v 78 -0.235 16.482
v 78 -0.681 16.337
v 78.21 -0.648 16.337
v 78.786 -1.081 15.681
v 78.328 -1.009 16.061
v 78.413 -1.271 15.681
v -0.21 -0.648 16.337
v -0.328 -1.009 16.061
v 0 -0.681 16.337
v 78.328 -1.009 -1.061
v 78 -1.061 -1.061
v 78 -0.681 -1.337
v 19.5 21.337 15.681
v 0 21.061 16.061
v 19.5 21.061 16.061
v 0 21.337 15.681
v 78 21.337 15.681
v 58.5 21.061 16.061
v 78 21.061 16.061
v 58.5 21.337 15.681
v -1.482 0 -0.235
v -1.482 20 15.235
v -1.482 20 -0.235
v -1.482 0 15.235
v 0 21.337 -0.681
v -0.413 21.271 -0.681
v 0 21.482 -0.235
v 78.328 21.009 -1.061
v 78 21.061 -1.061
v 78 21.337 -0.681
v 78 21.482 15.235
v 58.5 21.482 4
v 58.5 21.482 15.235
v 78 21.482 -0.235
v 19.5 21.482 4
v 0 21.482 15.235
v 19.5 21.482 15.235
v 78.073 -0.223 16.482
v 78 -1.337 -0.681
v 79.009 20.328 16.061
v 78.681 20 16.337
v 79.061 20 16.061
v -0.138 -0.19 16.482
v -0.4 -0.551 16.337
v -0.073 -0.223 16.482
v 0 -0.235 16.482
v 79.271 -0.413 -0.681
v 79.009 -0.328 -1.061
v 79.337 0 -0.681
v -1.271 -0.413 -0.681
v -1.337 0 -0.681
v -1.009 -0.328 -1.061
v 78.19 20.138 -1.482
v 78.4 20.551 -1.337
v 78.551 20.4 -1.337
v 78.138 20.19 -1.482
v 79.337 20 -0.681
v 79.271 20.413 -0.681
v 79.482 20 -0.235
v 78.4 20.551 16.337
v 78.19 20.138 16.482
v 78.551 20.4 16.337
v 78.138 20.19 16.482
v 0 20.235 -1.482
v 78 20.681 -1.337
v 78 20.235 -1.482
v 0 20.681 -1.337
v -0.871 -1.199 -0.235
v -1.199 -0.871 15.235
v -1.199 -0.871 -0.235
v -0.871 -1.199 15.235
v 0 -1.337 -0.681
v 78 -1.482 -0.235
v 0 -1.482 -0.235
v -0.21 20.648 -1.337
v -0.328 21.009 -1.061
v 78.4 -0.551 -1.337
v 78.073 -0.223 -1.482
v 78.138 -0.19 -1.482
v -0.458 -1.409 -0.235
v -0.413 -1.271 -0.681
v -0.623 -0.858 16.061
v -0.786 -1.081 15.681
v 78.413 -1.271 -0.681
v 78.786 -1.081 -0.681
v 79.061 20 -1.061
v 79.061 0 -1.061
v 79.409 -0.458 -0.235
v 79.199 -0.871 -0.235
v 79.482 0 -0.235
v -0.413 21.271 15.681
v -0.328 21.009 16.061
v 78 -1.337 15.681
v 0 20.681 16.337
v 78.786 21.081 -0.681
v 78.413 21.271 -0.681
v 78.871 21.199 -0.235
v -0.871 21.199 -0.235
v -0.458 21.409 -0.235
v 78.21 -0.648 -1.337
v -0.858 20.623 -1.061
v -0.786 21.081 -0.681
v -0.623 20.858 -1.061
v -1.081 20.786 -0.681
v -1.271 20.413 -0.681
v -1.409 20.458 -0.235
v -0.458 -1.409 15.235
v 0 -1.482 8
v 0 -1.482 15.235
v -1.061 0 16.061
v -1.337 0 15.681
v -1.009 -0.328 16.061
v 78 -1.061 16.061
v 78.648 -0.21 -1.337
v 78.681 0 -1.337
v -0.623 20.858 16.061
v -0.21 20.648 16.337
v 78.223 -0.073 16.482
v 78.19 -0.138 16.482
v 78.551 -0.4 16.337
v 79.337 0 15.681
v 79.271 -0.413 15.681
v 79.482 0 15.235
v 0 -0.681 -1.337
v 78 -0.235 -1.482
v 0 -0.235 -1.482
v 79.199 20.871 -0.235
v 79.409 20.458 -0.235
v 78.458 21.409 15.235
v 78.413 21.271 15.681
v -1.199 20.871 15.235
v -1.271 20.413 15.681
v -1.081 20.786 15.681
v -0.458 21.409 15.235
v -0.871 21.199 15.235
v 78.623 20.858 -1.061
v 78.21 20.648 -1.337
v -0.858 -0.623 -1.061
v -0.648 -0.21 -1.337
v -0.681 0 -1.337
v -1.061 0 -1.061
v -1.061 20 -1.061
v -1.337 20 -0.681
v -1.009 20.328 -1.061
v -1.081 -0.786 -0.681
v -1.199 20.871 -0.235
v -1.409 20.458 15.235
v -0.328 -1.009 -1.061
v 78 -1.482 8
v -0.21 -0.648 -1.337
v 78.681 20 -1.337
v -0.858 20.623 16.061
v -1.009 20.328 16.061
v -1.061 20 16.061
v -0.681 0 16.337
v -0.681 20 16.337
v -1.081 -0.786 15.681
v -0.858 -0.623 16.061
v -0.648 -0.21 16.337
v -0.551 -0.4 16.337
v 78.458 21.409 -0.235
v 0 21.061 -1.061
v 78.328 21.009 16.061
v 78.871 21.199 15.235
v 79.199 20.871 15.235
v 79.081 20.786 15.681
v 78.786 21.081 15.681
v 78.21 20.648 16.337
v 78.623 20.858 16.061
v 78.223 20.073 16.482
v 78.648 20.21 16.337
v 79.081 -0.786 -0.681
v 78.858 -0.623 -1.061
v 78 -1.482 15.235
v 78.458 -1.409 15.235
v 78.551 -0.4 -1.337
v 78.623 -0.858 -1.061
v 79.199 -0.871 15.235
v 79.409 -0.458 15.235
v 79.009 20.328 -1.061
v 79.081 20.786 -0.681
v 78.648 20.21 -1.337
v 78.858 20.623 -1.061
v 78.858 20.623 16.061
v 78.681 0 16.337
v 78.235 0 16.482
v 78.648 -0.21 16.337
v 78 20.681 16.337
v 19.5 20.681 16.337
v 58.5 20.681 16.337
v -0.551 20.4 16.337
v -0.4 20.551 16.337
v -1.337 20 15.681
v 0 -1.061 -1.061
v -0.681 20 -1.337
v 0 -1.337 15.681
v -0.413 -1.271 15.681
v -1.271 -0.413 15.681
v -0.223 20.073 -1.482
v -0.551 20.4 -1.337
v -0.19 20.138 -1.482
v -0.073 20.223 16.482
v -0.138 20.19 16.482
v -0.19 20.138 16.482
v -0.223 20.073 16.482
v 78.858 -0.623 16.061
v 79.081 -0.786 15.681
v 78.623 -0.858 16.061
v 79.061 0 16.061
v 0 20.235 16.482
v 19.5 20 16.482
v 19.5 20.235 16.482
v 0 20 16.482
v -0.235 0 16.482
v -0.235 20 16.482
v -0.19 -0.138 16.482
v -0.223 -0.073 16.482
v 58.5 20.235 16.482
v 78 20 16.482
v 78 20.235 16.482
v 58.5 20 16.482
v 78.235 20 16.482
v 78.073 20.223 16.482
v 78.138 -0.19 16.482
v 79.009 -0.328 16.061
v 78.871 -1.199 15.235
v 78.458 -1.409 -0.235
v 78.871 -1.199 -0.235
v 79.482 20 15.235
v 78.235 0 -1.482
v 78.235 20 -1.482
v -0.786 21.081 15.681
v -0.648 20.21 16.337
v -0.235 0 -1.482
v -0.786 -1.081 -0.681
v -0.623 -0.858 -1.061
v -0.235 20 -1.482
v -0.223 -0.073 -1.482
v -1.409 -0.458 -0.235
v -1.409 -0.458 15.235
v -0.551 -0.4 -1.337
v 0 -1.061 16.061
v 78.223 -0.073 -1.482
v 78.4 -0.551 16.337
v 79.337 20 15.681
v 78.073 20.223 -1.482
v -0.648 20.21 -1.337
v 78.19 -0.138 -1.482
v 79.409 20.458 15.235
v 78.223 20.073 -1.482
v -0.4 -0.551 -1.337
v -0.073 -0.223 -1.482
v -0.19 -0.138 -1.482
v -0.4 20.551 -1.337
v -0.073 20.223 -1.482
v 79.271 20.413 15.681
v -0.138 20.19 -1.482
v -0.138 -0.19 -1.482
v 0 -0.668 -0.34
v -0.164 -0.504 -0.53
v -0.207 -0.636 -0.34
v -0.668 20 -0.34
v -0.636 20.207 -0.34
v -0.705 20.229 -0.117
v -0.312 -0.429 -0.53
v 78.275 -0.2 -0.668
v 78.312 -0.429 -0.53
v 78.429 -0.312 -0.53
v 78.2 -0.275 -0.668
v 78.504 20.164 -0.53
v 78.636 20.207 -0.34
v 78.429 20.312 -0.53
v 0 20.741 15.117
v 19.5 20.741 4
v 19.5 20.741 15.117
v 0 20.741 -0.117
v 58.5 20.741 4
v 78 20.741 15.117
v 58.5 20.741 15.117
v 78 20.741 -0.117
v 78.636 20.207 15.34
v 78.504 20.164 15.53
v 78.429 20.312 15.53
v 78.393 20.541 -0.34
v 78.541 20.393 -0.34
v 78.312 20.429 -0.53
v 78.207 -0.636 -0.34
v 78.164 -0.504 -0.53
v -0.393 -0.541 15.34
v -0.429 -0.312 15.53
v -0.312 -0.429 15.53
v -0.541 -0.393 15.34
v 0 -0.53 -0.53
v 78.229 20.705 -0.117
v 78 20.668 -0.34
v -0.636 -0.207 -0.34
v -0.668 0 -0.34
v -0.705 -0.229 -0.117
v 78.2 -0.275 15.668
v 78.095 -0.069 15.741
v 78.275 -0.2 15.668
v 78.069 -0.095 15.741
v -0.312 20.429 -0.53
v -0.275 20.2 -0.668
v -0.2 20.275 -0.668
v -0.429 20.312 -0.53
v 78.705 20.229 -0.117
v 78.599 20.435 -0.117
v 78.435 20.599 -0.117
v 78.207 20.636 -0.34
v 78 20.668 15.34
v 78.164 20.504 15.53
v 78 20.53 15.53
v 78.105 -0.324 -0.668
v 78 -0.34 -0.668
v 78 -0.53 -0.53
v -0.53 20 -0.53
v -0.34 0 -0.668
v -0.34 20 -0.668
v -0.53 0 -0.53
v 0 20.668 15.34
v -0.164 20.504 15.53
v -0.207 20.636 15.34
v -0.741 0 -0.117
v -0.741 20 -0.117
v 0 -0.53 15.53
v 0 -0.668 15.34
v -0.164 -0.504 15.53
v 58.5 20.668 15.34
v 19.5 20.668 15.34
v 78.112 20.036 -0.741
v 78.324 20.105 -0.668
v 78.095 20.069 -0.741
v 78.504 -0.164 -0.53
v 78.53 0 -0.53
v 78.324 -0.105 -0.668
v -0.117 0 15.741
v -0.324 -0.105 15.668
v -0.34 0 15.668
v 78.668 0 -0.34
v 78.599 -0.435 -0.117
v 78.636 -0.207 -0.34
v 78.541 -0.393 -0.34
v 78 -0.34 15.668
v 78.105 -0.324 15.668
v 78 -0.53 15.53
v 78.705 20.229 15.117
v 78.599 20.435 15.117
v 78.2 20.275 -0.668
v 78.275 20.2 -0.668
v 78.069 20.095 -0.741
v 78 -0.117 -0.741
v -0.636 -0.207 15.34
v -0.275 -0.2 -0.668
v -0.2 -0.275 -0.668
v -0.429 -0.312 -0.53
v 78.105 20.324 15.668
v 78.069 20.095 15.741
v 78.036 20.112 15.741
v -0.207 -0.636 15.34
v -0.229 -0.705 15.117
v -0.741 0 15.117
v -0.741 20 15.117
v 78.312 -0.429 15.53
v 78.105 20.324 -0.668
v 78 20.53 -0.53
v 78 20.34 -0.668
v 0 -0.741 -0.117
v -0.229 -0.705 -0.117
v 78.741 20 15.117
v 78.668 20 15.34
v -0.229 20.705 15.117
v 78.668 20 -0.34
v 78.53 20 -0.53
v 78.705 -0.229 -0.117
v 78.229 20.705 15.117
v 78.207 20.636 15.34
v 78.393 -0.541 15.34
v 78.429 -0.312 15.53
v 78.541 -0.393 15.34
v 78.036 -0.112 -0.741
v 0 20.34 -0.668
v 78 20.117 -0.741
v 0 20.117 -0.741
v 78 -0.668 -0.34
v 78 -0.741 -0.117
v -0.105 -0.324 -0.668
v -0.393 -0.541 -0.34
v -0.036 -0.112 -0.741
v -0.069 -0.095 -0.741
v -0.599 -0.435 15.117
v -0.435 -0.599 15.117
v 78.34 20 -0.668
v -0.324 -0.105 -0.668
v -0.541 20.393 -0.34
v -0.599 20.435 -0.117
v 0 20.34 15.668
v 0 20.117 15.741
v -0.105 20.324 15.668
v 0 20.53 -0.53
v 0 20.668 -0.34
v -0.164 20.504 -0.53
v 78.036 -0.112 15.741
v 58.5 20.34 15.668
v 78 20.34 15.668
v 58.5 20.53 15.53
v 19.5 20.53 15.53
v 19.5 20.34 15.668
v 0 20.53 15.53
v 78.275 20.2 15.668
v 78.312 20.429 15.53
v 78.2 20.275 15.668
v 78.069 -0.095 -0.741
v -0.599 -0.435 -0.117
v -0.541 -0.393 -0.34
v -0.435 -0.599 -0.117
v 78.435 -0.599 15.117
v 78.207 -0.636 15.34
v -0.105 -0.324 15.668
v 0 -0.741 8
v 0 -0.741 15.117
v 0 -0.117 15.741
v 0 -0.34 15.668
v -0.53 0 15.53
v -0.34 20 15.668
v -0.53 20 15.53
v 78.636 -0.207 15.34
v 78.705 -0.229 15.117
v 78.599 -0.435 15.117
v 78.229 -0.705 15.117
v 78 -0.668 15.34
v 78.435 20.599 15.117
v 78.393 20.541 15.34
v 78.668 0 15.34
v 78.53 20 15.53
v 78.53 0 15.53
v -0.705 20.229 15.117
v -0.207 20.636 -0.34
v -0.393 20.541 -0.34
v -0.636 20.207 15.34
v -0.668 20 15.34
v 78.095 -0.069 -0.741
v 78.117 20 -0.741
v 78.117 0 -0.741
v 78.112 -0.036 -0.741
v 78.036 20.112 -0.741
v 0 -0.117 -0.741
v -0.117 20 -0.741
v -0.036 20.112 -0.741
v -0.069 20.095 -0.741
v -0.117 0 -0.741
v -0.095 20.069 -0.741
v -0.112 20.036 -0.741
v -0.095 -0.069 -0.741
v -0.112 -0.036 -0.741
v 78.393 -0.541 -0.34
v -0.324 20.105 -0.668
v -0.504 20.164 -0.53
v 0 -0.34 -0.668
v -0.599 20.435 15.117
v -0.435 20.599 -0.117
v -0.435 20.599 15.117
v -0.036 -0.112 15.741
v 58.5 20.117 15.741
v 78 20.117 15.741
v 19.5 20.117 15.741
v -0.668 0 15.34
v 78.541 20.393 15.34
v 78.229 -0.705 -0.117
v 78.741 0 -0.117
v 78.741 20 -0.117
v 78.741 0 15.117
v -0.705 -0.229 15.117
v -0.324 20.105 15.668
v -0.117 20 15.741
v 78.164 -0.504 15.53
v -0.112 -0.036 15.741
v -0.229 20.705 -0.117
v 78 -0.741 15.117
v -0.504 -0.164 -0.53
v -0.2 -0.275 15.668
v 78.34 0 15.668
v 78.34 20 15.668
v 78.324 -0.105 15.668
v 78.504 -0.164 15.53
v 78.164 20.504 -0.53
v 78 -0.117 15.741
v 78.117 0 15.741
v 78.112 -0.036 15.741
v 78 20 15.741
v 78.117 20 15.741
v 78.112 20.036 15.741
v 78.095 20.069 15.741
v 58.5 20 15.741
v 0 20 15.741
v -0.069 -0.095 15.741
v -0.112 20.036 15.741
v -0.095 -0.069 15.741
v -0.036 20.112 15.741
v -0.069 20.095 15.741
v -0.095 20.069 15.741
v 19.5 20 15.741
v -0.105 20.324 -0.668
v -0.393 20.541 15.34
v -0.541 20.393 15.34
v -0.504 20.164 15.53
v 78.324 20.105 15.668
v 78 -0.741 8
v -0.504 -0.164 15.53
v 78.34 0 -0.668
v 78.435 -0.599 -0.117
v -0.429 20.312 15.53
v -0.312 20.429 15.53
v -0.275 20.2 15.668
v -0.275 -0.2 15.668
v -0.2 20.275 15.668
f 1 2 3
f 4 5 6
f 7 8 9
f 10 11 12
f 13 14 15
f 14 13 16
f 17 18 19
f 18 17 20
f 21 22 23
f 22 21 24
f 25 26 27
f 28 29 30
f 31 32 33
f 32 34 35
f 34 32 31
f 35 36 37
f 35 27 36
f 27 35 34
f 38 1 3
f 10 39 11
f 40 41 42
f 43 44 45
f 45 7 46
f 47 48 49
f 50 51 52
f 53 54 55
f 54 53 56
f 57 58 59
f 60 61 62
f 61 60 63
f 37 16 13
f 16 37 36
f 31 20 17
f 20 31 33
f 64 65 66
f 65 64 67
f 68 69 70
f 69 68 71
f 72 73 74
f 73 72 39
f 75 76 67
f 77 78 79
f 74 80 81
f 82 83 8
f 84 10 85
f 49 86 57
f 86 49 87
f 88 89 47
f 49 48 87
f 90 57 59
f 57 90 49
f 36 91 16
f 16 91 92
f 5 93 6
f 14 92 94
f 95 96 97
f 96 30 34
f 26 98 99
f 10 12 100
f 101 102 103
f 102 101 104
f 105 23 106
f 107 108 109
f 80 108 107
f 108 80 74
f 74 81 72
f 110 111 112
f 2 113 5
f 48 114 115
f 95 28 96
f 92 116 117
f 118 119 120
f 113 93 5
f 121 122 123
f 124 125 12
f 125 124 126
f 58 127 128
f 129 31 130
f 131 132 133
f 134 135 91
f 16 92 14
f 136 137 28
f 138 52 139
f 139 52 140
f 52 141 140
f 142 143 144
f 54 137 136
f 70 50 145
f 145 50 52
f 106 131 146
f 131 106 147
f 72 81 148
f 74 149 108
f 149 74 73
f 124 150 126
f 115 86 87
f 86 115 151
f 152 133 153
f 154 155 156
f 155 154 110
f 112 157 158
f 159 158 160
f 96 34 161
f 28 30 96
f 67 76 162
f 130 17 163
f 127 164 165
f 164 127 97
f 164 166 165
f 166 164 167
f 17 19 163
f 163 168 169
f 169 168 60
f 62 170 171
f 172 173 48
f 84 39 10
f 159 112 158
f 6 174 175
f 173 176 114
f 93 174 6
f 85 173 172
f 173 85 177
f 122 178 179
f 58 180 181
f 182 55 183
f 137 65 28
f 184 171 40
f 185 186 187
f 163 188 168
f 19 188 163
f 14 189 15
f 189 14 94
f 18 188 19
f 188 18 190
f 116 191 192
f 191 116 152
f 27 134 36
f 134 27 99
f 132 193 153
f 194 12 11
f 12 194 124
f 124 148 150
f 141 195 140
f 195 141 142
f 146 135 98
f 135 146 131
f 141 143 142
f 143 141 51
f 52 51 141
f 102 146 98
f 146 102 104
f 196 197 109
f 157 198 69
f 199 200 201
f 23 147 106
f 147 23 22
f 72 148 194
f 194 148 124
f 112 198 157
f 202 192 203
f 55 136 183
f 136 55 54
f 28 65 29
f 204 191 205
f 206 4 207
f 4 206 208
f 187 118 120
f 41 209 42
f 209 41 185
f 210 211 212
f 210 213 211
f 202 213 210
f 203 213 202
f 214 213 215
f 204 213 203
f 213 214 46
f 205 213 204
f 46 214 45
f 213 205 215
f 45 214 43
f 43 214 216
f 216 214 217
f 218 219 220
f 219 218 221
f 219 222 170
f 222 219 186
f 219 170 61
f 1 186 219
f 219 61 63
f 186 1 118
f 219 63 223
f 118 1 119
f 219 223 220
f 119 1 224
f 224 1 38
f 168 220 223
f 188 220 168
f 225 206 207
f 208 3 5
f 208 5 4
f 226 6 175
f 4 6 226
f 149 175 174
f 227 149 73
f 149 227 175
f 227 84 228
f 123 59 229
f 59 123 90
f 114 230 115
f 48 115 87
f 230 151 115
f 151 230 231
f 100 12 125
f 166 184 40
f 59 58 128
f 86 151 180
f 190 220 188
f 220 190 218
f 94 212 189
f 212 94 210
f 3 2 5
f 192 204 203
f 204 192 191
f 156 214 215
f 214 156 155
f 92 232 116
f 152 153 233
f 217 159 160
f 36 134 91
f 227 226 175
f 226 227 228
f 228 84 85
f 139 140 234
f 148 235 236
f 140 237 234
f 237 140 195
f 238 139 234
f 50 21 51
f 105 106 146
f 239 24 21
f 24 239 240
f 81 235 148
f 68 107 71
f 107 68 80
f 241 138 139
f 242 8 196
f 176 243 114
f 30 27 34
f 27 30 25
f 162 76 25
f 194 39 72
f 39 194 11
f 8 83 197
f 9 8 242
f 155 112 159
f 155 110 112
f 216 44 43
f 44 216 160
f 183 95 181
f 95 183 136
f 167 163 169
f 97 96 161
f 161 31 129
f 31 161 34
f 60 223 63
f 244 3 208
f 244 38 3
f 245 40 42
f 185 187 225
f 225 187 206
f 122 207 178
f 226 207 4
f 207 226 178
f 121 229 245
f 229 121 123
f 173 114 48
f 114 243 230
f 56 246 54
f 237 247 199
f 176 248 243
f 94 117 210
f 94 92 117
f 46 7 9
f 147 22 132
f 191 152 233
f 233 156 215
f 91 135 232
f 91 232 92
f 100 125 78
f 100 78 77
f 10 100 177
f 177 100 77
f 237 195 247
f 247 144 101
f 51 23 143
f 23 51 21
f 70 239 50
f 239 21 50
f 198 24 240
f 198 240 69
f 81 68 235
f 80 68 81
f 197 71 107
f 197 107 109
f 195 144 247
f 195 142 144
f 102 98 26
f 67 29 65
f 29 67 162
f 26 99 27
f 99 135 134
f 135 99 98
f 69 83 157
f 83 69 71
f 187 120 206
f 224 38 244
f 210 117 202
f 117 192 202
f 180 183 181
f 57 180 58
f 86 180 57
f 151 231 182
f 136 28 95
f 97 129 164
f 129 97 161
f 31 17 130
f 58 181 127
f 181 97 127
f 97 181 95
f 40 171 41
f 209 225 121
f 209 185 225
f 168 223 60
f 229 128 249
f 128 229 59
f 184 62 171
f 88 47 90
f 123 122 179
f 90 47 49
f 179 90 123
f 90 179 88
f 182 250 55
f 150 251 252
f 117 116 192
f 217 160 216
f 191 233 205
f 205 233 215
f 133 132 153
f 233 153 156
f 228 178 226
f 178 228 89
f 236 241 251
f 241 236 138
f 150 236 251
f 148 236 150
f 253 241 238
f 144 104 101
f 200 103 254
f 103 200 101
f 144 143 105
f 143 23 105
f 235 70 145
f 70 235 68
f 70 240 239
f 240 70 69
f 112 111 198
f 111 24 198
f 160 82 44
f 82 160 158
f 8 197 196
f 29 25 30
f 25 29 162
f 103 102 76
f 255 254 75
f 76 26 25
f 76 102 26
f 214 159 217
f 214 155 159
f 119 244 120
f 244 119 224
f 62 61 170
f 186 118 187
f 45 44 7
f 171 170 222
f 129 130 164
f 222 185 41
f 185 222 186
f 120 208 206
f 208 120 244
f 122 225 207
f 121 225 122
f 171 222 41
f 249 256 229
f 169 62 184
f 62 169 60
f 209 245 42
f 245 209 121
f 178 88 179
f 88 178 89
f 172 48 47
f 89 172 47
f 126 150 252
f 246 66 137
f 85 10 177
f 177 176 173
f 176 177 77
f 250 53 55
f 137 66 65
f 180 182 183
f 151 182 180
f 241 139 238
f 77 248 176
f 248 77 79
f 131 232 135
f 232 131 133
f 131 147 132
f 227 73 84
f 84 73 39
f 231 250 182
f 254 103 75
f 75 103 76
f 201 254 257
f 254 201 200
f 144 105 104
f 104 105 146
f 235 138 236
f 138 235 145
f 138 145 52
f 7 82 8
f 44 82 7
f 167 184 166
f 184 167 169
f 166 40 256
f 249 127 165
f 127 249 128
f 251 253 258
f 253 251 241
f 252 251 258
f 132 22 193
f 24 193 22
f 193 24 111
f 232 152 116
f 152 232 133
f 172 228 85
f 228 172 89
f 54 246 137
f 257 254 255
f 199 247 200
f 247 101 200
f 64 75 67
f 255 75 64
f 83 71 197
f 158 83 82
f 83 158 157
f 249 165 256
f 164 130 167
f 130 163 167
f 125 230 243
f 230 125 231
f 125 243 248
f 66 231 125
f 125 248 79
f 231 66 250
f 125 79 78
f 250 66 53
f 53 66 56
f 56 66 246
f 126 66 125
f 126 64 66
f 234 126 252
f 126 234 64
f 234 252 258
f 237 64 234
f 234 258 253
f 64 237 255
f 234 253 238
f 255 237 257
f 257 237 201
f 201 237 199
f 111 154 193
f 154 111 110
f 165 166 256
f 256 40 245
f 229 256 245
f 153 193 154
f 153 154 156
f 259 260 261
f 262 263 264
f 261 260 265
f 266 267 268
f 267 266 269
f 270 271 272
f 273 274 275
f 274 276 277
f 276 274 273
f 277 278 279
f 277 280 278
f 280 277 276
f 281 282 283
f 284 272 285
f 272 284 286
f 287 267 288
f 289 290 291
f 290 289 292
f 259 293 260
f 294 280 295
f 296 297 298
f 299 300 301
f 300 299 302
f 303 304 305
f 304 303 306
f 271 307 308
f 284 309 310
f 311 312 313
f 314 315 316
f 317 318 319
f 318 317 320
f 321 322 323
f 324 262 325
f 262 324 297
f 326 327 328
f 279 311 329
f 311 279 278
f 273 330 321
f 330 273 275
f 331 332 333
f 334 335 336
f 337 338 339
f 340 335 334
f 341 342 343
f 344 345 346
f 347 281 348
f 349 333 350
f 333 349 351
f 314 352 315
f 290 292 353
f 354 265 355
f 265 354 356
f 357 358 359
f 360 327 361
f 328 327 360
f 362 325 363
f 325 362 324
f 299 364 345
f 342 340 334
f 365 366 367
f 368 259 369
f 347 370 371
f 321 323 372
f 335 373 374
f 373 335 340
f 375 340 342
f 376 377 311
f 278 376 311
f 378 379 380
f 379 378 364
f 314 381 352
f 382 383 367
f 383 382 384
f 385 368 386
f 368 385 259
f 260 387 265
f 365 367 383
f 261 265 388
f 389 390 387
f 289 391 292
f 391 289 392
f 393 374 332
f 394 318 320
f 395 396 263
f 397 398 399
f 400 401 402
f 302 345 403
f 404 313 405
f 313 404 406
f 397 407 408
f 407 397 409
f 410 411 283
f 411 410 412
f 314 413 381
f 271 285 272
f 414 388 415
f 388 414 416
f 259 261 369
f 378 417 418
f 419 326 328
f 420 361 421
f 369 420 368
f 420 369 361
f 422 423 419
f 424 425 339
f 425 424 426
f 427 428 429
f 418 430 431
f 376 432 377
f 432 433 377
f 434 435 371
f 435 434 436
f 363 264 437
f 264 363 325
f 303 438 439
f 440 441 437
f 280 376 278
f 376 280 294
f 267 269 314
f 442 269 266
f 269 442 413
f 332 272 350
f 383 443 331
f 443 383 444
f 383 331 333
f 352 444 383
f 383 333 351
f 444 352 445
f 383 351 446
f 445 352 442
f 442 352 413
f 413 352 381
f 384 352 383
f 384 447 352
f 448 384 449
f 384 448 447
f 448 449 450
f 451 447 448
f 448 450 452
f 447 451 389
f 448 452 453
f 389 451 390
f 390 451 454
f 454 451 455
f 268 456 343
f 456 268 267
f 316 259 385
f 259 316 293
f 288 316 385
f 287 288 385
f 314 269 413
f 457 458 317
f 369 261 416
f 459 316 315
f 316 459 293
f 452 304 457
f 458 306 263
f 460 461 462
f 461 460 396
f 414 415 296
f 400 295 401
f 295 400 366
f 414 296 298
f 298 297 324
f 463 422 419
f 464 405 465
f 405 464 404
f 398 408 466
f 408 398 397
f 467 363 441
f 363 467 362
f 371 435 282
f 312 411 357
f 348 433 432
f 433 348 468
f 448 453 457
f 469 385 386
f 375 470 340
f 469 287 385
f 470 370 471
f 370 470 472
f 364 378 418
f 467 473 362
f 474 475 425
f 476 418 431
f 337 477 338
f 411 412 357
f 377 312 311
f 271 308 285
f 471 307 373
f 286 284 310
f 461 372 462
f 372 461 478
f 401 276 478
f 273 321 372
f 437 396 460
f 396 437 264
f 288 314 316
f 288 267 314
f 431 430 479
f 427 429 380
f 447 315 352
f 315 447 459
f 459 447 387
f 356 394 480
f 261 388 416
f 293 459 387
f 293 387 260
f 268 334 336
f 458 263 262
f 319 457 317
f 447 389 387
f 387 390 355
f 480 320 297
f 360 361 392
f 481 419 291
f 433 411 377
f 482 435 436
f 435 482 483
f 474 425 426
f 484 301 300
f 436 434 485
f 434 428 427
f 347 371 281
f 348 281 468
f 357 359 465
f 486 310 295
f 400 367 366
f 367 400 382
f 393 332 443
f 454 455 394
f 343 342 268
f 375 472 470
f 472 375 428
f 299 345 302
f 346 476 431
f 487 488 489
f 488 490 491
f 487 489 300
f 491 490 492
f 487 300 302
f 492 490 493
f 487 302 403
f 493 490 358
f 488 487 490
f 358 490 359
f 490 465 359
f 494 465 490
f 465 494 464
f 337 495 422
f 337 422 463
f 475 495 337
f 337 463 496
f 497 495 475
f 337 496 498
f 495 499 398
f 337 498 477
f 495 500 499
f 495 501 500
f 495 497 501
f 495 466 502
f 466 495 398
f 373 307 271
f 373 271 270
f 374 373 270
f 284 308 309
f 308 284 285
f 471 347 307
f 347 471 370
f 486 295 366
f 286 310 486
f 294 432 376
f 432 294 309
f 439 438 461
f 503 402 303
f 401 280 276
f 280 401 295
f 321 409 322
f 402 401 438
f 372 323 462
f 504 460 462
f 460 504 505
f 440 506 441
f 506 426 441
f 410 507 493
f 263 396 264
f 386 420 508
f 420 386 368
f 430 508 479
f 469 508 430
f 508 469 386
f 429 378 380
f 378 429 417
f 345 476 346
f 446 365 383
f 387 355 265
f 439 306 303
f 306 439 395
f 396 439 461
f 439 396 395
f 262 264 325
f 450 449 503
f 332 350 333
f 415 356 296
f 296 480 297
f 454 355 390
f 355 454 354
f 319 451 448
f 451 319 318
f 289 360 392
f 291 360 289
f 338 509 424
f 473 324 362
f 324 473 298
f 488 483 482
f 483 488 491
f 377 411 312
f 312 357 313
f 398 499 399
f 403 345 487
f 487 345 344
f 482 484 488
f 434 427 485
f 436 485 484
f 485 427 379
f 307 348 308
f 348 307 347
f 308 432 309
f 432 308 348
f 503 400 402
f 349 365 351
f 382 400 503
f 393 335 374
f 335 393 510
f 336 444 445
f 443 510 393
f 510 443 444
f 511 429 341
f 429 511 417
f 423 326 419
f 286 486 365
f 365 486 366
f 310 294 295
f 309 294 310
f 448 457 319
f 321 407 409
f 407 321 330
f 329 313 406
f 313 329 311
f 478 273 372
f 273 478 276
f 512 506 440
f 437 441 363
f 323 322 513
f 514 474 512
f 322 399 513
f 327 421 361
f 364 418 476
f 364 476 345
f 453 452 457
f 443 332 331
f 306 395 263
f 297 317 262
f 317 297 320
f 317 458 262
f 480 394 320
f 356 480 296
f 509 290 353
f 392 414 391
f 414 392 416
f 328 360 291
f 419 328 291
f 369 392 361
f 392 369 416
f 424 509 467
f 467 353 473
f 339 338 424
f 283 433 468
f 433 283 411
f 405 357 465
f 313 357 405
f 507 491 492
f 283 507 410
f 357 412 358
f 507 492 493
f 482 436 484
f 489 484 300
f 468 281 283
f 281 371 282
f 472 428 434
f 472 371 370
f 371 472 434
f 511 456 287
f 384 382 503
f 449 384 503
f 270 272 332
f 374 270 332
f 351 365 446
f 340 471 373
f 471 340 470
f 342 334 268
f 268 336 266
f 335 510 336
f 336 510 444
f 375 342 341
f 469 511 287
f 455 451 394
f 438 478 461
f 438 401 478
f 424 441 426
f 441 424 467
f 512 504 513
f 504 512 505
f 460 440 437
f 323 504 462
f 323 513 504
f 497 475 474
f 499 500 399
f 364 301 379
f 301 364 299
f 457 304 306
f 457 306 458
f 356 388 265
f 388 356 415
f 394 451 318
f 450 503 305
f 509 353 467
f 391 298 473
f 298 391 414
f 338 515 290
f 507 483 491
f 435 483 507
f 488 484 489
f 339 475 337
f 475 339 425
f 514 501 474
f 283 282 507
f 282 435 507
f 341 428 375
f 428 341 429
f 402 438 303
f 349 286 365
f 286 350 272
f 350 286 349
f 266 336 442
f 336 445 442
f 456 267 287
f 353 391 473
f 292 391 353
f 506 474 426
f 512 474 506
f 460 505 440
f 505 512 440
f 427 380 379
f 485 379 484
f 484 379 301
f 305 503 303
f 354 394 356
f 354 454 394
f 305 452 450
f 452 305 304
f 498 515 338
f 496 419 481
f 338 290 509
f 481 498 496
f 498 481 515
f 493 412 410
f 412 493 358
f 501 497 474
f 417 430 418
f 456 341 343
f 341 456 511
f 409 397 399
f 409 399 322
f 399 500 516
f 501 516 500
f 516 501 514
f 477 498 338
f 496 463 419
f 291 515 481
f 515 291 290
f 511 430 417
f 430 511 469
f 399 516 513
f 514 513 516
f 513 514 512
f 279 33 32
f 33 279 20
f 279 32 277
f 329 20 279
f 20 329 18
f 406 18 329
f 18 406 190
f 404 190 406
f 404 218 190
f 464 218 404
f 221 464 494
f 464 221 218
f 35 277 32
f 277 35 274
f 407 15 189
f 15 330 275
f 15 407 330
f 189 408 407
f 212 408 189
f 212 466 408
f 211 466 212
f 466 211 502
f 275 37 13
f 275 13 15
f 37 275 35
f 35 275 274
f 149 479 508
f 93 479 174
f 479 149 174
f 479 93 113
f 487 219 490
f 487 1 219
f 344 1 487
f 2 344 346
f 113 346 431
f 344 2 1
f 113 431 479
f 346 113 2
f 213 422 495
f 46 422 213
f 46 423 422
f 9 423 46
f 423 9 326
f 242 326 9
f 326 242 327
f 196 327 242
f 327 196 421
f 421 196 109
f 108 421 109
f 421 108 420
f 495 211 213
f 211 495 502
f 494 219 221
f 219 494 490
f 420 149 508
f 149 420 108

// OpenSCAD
box = [68+10,20,15];
$fn=20;
difference(){
    minkowski(){
    sphere(d=3);
    cube (box);
    }
    minkowski(){
        sphere(d=1.5);
        cube(box);
        }
    translate([box[0]/4,box[1]/2+5,4]) cube([box[0]/2,box[1]/2,100]);
    translate([0,0,box[2]/2])cube(box);
    translate([0,-box[1]/2,8])cube(box);

} 
